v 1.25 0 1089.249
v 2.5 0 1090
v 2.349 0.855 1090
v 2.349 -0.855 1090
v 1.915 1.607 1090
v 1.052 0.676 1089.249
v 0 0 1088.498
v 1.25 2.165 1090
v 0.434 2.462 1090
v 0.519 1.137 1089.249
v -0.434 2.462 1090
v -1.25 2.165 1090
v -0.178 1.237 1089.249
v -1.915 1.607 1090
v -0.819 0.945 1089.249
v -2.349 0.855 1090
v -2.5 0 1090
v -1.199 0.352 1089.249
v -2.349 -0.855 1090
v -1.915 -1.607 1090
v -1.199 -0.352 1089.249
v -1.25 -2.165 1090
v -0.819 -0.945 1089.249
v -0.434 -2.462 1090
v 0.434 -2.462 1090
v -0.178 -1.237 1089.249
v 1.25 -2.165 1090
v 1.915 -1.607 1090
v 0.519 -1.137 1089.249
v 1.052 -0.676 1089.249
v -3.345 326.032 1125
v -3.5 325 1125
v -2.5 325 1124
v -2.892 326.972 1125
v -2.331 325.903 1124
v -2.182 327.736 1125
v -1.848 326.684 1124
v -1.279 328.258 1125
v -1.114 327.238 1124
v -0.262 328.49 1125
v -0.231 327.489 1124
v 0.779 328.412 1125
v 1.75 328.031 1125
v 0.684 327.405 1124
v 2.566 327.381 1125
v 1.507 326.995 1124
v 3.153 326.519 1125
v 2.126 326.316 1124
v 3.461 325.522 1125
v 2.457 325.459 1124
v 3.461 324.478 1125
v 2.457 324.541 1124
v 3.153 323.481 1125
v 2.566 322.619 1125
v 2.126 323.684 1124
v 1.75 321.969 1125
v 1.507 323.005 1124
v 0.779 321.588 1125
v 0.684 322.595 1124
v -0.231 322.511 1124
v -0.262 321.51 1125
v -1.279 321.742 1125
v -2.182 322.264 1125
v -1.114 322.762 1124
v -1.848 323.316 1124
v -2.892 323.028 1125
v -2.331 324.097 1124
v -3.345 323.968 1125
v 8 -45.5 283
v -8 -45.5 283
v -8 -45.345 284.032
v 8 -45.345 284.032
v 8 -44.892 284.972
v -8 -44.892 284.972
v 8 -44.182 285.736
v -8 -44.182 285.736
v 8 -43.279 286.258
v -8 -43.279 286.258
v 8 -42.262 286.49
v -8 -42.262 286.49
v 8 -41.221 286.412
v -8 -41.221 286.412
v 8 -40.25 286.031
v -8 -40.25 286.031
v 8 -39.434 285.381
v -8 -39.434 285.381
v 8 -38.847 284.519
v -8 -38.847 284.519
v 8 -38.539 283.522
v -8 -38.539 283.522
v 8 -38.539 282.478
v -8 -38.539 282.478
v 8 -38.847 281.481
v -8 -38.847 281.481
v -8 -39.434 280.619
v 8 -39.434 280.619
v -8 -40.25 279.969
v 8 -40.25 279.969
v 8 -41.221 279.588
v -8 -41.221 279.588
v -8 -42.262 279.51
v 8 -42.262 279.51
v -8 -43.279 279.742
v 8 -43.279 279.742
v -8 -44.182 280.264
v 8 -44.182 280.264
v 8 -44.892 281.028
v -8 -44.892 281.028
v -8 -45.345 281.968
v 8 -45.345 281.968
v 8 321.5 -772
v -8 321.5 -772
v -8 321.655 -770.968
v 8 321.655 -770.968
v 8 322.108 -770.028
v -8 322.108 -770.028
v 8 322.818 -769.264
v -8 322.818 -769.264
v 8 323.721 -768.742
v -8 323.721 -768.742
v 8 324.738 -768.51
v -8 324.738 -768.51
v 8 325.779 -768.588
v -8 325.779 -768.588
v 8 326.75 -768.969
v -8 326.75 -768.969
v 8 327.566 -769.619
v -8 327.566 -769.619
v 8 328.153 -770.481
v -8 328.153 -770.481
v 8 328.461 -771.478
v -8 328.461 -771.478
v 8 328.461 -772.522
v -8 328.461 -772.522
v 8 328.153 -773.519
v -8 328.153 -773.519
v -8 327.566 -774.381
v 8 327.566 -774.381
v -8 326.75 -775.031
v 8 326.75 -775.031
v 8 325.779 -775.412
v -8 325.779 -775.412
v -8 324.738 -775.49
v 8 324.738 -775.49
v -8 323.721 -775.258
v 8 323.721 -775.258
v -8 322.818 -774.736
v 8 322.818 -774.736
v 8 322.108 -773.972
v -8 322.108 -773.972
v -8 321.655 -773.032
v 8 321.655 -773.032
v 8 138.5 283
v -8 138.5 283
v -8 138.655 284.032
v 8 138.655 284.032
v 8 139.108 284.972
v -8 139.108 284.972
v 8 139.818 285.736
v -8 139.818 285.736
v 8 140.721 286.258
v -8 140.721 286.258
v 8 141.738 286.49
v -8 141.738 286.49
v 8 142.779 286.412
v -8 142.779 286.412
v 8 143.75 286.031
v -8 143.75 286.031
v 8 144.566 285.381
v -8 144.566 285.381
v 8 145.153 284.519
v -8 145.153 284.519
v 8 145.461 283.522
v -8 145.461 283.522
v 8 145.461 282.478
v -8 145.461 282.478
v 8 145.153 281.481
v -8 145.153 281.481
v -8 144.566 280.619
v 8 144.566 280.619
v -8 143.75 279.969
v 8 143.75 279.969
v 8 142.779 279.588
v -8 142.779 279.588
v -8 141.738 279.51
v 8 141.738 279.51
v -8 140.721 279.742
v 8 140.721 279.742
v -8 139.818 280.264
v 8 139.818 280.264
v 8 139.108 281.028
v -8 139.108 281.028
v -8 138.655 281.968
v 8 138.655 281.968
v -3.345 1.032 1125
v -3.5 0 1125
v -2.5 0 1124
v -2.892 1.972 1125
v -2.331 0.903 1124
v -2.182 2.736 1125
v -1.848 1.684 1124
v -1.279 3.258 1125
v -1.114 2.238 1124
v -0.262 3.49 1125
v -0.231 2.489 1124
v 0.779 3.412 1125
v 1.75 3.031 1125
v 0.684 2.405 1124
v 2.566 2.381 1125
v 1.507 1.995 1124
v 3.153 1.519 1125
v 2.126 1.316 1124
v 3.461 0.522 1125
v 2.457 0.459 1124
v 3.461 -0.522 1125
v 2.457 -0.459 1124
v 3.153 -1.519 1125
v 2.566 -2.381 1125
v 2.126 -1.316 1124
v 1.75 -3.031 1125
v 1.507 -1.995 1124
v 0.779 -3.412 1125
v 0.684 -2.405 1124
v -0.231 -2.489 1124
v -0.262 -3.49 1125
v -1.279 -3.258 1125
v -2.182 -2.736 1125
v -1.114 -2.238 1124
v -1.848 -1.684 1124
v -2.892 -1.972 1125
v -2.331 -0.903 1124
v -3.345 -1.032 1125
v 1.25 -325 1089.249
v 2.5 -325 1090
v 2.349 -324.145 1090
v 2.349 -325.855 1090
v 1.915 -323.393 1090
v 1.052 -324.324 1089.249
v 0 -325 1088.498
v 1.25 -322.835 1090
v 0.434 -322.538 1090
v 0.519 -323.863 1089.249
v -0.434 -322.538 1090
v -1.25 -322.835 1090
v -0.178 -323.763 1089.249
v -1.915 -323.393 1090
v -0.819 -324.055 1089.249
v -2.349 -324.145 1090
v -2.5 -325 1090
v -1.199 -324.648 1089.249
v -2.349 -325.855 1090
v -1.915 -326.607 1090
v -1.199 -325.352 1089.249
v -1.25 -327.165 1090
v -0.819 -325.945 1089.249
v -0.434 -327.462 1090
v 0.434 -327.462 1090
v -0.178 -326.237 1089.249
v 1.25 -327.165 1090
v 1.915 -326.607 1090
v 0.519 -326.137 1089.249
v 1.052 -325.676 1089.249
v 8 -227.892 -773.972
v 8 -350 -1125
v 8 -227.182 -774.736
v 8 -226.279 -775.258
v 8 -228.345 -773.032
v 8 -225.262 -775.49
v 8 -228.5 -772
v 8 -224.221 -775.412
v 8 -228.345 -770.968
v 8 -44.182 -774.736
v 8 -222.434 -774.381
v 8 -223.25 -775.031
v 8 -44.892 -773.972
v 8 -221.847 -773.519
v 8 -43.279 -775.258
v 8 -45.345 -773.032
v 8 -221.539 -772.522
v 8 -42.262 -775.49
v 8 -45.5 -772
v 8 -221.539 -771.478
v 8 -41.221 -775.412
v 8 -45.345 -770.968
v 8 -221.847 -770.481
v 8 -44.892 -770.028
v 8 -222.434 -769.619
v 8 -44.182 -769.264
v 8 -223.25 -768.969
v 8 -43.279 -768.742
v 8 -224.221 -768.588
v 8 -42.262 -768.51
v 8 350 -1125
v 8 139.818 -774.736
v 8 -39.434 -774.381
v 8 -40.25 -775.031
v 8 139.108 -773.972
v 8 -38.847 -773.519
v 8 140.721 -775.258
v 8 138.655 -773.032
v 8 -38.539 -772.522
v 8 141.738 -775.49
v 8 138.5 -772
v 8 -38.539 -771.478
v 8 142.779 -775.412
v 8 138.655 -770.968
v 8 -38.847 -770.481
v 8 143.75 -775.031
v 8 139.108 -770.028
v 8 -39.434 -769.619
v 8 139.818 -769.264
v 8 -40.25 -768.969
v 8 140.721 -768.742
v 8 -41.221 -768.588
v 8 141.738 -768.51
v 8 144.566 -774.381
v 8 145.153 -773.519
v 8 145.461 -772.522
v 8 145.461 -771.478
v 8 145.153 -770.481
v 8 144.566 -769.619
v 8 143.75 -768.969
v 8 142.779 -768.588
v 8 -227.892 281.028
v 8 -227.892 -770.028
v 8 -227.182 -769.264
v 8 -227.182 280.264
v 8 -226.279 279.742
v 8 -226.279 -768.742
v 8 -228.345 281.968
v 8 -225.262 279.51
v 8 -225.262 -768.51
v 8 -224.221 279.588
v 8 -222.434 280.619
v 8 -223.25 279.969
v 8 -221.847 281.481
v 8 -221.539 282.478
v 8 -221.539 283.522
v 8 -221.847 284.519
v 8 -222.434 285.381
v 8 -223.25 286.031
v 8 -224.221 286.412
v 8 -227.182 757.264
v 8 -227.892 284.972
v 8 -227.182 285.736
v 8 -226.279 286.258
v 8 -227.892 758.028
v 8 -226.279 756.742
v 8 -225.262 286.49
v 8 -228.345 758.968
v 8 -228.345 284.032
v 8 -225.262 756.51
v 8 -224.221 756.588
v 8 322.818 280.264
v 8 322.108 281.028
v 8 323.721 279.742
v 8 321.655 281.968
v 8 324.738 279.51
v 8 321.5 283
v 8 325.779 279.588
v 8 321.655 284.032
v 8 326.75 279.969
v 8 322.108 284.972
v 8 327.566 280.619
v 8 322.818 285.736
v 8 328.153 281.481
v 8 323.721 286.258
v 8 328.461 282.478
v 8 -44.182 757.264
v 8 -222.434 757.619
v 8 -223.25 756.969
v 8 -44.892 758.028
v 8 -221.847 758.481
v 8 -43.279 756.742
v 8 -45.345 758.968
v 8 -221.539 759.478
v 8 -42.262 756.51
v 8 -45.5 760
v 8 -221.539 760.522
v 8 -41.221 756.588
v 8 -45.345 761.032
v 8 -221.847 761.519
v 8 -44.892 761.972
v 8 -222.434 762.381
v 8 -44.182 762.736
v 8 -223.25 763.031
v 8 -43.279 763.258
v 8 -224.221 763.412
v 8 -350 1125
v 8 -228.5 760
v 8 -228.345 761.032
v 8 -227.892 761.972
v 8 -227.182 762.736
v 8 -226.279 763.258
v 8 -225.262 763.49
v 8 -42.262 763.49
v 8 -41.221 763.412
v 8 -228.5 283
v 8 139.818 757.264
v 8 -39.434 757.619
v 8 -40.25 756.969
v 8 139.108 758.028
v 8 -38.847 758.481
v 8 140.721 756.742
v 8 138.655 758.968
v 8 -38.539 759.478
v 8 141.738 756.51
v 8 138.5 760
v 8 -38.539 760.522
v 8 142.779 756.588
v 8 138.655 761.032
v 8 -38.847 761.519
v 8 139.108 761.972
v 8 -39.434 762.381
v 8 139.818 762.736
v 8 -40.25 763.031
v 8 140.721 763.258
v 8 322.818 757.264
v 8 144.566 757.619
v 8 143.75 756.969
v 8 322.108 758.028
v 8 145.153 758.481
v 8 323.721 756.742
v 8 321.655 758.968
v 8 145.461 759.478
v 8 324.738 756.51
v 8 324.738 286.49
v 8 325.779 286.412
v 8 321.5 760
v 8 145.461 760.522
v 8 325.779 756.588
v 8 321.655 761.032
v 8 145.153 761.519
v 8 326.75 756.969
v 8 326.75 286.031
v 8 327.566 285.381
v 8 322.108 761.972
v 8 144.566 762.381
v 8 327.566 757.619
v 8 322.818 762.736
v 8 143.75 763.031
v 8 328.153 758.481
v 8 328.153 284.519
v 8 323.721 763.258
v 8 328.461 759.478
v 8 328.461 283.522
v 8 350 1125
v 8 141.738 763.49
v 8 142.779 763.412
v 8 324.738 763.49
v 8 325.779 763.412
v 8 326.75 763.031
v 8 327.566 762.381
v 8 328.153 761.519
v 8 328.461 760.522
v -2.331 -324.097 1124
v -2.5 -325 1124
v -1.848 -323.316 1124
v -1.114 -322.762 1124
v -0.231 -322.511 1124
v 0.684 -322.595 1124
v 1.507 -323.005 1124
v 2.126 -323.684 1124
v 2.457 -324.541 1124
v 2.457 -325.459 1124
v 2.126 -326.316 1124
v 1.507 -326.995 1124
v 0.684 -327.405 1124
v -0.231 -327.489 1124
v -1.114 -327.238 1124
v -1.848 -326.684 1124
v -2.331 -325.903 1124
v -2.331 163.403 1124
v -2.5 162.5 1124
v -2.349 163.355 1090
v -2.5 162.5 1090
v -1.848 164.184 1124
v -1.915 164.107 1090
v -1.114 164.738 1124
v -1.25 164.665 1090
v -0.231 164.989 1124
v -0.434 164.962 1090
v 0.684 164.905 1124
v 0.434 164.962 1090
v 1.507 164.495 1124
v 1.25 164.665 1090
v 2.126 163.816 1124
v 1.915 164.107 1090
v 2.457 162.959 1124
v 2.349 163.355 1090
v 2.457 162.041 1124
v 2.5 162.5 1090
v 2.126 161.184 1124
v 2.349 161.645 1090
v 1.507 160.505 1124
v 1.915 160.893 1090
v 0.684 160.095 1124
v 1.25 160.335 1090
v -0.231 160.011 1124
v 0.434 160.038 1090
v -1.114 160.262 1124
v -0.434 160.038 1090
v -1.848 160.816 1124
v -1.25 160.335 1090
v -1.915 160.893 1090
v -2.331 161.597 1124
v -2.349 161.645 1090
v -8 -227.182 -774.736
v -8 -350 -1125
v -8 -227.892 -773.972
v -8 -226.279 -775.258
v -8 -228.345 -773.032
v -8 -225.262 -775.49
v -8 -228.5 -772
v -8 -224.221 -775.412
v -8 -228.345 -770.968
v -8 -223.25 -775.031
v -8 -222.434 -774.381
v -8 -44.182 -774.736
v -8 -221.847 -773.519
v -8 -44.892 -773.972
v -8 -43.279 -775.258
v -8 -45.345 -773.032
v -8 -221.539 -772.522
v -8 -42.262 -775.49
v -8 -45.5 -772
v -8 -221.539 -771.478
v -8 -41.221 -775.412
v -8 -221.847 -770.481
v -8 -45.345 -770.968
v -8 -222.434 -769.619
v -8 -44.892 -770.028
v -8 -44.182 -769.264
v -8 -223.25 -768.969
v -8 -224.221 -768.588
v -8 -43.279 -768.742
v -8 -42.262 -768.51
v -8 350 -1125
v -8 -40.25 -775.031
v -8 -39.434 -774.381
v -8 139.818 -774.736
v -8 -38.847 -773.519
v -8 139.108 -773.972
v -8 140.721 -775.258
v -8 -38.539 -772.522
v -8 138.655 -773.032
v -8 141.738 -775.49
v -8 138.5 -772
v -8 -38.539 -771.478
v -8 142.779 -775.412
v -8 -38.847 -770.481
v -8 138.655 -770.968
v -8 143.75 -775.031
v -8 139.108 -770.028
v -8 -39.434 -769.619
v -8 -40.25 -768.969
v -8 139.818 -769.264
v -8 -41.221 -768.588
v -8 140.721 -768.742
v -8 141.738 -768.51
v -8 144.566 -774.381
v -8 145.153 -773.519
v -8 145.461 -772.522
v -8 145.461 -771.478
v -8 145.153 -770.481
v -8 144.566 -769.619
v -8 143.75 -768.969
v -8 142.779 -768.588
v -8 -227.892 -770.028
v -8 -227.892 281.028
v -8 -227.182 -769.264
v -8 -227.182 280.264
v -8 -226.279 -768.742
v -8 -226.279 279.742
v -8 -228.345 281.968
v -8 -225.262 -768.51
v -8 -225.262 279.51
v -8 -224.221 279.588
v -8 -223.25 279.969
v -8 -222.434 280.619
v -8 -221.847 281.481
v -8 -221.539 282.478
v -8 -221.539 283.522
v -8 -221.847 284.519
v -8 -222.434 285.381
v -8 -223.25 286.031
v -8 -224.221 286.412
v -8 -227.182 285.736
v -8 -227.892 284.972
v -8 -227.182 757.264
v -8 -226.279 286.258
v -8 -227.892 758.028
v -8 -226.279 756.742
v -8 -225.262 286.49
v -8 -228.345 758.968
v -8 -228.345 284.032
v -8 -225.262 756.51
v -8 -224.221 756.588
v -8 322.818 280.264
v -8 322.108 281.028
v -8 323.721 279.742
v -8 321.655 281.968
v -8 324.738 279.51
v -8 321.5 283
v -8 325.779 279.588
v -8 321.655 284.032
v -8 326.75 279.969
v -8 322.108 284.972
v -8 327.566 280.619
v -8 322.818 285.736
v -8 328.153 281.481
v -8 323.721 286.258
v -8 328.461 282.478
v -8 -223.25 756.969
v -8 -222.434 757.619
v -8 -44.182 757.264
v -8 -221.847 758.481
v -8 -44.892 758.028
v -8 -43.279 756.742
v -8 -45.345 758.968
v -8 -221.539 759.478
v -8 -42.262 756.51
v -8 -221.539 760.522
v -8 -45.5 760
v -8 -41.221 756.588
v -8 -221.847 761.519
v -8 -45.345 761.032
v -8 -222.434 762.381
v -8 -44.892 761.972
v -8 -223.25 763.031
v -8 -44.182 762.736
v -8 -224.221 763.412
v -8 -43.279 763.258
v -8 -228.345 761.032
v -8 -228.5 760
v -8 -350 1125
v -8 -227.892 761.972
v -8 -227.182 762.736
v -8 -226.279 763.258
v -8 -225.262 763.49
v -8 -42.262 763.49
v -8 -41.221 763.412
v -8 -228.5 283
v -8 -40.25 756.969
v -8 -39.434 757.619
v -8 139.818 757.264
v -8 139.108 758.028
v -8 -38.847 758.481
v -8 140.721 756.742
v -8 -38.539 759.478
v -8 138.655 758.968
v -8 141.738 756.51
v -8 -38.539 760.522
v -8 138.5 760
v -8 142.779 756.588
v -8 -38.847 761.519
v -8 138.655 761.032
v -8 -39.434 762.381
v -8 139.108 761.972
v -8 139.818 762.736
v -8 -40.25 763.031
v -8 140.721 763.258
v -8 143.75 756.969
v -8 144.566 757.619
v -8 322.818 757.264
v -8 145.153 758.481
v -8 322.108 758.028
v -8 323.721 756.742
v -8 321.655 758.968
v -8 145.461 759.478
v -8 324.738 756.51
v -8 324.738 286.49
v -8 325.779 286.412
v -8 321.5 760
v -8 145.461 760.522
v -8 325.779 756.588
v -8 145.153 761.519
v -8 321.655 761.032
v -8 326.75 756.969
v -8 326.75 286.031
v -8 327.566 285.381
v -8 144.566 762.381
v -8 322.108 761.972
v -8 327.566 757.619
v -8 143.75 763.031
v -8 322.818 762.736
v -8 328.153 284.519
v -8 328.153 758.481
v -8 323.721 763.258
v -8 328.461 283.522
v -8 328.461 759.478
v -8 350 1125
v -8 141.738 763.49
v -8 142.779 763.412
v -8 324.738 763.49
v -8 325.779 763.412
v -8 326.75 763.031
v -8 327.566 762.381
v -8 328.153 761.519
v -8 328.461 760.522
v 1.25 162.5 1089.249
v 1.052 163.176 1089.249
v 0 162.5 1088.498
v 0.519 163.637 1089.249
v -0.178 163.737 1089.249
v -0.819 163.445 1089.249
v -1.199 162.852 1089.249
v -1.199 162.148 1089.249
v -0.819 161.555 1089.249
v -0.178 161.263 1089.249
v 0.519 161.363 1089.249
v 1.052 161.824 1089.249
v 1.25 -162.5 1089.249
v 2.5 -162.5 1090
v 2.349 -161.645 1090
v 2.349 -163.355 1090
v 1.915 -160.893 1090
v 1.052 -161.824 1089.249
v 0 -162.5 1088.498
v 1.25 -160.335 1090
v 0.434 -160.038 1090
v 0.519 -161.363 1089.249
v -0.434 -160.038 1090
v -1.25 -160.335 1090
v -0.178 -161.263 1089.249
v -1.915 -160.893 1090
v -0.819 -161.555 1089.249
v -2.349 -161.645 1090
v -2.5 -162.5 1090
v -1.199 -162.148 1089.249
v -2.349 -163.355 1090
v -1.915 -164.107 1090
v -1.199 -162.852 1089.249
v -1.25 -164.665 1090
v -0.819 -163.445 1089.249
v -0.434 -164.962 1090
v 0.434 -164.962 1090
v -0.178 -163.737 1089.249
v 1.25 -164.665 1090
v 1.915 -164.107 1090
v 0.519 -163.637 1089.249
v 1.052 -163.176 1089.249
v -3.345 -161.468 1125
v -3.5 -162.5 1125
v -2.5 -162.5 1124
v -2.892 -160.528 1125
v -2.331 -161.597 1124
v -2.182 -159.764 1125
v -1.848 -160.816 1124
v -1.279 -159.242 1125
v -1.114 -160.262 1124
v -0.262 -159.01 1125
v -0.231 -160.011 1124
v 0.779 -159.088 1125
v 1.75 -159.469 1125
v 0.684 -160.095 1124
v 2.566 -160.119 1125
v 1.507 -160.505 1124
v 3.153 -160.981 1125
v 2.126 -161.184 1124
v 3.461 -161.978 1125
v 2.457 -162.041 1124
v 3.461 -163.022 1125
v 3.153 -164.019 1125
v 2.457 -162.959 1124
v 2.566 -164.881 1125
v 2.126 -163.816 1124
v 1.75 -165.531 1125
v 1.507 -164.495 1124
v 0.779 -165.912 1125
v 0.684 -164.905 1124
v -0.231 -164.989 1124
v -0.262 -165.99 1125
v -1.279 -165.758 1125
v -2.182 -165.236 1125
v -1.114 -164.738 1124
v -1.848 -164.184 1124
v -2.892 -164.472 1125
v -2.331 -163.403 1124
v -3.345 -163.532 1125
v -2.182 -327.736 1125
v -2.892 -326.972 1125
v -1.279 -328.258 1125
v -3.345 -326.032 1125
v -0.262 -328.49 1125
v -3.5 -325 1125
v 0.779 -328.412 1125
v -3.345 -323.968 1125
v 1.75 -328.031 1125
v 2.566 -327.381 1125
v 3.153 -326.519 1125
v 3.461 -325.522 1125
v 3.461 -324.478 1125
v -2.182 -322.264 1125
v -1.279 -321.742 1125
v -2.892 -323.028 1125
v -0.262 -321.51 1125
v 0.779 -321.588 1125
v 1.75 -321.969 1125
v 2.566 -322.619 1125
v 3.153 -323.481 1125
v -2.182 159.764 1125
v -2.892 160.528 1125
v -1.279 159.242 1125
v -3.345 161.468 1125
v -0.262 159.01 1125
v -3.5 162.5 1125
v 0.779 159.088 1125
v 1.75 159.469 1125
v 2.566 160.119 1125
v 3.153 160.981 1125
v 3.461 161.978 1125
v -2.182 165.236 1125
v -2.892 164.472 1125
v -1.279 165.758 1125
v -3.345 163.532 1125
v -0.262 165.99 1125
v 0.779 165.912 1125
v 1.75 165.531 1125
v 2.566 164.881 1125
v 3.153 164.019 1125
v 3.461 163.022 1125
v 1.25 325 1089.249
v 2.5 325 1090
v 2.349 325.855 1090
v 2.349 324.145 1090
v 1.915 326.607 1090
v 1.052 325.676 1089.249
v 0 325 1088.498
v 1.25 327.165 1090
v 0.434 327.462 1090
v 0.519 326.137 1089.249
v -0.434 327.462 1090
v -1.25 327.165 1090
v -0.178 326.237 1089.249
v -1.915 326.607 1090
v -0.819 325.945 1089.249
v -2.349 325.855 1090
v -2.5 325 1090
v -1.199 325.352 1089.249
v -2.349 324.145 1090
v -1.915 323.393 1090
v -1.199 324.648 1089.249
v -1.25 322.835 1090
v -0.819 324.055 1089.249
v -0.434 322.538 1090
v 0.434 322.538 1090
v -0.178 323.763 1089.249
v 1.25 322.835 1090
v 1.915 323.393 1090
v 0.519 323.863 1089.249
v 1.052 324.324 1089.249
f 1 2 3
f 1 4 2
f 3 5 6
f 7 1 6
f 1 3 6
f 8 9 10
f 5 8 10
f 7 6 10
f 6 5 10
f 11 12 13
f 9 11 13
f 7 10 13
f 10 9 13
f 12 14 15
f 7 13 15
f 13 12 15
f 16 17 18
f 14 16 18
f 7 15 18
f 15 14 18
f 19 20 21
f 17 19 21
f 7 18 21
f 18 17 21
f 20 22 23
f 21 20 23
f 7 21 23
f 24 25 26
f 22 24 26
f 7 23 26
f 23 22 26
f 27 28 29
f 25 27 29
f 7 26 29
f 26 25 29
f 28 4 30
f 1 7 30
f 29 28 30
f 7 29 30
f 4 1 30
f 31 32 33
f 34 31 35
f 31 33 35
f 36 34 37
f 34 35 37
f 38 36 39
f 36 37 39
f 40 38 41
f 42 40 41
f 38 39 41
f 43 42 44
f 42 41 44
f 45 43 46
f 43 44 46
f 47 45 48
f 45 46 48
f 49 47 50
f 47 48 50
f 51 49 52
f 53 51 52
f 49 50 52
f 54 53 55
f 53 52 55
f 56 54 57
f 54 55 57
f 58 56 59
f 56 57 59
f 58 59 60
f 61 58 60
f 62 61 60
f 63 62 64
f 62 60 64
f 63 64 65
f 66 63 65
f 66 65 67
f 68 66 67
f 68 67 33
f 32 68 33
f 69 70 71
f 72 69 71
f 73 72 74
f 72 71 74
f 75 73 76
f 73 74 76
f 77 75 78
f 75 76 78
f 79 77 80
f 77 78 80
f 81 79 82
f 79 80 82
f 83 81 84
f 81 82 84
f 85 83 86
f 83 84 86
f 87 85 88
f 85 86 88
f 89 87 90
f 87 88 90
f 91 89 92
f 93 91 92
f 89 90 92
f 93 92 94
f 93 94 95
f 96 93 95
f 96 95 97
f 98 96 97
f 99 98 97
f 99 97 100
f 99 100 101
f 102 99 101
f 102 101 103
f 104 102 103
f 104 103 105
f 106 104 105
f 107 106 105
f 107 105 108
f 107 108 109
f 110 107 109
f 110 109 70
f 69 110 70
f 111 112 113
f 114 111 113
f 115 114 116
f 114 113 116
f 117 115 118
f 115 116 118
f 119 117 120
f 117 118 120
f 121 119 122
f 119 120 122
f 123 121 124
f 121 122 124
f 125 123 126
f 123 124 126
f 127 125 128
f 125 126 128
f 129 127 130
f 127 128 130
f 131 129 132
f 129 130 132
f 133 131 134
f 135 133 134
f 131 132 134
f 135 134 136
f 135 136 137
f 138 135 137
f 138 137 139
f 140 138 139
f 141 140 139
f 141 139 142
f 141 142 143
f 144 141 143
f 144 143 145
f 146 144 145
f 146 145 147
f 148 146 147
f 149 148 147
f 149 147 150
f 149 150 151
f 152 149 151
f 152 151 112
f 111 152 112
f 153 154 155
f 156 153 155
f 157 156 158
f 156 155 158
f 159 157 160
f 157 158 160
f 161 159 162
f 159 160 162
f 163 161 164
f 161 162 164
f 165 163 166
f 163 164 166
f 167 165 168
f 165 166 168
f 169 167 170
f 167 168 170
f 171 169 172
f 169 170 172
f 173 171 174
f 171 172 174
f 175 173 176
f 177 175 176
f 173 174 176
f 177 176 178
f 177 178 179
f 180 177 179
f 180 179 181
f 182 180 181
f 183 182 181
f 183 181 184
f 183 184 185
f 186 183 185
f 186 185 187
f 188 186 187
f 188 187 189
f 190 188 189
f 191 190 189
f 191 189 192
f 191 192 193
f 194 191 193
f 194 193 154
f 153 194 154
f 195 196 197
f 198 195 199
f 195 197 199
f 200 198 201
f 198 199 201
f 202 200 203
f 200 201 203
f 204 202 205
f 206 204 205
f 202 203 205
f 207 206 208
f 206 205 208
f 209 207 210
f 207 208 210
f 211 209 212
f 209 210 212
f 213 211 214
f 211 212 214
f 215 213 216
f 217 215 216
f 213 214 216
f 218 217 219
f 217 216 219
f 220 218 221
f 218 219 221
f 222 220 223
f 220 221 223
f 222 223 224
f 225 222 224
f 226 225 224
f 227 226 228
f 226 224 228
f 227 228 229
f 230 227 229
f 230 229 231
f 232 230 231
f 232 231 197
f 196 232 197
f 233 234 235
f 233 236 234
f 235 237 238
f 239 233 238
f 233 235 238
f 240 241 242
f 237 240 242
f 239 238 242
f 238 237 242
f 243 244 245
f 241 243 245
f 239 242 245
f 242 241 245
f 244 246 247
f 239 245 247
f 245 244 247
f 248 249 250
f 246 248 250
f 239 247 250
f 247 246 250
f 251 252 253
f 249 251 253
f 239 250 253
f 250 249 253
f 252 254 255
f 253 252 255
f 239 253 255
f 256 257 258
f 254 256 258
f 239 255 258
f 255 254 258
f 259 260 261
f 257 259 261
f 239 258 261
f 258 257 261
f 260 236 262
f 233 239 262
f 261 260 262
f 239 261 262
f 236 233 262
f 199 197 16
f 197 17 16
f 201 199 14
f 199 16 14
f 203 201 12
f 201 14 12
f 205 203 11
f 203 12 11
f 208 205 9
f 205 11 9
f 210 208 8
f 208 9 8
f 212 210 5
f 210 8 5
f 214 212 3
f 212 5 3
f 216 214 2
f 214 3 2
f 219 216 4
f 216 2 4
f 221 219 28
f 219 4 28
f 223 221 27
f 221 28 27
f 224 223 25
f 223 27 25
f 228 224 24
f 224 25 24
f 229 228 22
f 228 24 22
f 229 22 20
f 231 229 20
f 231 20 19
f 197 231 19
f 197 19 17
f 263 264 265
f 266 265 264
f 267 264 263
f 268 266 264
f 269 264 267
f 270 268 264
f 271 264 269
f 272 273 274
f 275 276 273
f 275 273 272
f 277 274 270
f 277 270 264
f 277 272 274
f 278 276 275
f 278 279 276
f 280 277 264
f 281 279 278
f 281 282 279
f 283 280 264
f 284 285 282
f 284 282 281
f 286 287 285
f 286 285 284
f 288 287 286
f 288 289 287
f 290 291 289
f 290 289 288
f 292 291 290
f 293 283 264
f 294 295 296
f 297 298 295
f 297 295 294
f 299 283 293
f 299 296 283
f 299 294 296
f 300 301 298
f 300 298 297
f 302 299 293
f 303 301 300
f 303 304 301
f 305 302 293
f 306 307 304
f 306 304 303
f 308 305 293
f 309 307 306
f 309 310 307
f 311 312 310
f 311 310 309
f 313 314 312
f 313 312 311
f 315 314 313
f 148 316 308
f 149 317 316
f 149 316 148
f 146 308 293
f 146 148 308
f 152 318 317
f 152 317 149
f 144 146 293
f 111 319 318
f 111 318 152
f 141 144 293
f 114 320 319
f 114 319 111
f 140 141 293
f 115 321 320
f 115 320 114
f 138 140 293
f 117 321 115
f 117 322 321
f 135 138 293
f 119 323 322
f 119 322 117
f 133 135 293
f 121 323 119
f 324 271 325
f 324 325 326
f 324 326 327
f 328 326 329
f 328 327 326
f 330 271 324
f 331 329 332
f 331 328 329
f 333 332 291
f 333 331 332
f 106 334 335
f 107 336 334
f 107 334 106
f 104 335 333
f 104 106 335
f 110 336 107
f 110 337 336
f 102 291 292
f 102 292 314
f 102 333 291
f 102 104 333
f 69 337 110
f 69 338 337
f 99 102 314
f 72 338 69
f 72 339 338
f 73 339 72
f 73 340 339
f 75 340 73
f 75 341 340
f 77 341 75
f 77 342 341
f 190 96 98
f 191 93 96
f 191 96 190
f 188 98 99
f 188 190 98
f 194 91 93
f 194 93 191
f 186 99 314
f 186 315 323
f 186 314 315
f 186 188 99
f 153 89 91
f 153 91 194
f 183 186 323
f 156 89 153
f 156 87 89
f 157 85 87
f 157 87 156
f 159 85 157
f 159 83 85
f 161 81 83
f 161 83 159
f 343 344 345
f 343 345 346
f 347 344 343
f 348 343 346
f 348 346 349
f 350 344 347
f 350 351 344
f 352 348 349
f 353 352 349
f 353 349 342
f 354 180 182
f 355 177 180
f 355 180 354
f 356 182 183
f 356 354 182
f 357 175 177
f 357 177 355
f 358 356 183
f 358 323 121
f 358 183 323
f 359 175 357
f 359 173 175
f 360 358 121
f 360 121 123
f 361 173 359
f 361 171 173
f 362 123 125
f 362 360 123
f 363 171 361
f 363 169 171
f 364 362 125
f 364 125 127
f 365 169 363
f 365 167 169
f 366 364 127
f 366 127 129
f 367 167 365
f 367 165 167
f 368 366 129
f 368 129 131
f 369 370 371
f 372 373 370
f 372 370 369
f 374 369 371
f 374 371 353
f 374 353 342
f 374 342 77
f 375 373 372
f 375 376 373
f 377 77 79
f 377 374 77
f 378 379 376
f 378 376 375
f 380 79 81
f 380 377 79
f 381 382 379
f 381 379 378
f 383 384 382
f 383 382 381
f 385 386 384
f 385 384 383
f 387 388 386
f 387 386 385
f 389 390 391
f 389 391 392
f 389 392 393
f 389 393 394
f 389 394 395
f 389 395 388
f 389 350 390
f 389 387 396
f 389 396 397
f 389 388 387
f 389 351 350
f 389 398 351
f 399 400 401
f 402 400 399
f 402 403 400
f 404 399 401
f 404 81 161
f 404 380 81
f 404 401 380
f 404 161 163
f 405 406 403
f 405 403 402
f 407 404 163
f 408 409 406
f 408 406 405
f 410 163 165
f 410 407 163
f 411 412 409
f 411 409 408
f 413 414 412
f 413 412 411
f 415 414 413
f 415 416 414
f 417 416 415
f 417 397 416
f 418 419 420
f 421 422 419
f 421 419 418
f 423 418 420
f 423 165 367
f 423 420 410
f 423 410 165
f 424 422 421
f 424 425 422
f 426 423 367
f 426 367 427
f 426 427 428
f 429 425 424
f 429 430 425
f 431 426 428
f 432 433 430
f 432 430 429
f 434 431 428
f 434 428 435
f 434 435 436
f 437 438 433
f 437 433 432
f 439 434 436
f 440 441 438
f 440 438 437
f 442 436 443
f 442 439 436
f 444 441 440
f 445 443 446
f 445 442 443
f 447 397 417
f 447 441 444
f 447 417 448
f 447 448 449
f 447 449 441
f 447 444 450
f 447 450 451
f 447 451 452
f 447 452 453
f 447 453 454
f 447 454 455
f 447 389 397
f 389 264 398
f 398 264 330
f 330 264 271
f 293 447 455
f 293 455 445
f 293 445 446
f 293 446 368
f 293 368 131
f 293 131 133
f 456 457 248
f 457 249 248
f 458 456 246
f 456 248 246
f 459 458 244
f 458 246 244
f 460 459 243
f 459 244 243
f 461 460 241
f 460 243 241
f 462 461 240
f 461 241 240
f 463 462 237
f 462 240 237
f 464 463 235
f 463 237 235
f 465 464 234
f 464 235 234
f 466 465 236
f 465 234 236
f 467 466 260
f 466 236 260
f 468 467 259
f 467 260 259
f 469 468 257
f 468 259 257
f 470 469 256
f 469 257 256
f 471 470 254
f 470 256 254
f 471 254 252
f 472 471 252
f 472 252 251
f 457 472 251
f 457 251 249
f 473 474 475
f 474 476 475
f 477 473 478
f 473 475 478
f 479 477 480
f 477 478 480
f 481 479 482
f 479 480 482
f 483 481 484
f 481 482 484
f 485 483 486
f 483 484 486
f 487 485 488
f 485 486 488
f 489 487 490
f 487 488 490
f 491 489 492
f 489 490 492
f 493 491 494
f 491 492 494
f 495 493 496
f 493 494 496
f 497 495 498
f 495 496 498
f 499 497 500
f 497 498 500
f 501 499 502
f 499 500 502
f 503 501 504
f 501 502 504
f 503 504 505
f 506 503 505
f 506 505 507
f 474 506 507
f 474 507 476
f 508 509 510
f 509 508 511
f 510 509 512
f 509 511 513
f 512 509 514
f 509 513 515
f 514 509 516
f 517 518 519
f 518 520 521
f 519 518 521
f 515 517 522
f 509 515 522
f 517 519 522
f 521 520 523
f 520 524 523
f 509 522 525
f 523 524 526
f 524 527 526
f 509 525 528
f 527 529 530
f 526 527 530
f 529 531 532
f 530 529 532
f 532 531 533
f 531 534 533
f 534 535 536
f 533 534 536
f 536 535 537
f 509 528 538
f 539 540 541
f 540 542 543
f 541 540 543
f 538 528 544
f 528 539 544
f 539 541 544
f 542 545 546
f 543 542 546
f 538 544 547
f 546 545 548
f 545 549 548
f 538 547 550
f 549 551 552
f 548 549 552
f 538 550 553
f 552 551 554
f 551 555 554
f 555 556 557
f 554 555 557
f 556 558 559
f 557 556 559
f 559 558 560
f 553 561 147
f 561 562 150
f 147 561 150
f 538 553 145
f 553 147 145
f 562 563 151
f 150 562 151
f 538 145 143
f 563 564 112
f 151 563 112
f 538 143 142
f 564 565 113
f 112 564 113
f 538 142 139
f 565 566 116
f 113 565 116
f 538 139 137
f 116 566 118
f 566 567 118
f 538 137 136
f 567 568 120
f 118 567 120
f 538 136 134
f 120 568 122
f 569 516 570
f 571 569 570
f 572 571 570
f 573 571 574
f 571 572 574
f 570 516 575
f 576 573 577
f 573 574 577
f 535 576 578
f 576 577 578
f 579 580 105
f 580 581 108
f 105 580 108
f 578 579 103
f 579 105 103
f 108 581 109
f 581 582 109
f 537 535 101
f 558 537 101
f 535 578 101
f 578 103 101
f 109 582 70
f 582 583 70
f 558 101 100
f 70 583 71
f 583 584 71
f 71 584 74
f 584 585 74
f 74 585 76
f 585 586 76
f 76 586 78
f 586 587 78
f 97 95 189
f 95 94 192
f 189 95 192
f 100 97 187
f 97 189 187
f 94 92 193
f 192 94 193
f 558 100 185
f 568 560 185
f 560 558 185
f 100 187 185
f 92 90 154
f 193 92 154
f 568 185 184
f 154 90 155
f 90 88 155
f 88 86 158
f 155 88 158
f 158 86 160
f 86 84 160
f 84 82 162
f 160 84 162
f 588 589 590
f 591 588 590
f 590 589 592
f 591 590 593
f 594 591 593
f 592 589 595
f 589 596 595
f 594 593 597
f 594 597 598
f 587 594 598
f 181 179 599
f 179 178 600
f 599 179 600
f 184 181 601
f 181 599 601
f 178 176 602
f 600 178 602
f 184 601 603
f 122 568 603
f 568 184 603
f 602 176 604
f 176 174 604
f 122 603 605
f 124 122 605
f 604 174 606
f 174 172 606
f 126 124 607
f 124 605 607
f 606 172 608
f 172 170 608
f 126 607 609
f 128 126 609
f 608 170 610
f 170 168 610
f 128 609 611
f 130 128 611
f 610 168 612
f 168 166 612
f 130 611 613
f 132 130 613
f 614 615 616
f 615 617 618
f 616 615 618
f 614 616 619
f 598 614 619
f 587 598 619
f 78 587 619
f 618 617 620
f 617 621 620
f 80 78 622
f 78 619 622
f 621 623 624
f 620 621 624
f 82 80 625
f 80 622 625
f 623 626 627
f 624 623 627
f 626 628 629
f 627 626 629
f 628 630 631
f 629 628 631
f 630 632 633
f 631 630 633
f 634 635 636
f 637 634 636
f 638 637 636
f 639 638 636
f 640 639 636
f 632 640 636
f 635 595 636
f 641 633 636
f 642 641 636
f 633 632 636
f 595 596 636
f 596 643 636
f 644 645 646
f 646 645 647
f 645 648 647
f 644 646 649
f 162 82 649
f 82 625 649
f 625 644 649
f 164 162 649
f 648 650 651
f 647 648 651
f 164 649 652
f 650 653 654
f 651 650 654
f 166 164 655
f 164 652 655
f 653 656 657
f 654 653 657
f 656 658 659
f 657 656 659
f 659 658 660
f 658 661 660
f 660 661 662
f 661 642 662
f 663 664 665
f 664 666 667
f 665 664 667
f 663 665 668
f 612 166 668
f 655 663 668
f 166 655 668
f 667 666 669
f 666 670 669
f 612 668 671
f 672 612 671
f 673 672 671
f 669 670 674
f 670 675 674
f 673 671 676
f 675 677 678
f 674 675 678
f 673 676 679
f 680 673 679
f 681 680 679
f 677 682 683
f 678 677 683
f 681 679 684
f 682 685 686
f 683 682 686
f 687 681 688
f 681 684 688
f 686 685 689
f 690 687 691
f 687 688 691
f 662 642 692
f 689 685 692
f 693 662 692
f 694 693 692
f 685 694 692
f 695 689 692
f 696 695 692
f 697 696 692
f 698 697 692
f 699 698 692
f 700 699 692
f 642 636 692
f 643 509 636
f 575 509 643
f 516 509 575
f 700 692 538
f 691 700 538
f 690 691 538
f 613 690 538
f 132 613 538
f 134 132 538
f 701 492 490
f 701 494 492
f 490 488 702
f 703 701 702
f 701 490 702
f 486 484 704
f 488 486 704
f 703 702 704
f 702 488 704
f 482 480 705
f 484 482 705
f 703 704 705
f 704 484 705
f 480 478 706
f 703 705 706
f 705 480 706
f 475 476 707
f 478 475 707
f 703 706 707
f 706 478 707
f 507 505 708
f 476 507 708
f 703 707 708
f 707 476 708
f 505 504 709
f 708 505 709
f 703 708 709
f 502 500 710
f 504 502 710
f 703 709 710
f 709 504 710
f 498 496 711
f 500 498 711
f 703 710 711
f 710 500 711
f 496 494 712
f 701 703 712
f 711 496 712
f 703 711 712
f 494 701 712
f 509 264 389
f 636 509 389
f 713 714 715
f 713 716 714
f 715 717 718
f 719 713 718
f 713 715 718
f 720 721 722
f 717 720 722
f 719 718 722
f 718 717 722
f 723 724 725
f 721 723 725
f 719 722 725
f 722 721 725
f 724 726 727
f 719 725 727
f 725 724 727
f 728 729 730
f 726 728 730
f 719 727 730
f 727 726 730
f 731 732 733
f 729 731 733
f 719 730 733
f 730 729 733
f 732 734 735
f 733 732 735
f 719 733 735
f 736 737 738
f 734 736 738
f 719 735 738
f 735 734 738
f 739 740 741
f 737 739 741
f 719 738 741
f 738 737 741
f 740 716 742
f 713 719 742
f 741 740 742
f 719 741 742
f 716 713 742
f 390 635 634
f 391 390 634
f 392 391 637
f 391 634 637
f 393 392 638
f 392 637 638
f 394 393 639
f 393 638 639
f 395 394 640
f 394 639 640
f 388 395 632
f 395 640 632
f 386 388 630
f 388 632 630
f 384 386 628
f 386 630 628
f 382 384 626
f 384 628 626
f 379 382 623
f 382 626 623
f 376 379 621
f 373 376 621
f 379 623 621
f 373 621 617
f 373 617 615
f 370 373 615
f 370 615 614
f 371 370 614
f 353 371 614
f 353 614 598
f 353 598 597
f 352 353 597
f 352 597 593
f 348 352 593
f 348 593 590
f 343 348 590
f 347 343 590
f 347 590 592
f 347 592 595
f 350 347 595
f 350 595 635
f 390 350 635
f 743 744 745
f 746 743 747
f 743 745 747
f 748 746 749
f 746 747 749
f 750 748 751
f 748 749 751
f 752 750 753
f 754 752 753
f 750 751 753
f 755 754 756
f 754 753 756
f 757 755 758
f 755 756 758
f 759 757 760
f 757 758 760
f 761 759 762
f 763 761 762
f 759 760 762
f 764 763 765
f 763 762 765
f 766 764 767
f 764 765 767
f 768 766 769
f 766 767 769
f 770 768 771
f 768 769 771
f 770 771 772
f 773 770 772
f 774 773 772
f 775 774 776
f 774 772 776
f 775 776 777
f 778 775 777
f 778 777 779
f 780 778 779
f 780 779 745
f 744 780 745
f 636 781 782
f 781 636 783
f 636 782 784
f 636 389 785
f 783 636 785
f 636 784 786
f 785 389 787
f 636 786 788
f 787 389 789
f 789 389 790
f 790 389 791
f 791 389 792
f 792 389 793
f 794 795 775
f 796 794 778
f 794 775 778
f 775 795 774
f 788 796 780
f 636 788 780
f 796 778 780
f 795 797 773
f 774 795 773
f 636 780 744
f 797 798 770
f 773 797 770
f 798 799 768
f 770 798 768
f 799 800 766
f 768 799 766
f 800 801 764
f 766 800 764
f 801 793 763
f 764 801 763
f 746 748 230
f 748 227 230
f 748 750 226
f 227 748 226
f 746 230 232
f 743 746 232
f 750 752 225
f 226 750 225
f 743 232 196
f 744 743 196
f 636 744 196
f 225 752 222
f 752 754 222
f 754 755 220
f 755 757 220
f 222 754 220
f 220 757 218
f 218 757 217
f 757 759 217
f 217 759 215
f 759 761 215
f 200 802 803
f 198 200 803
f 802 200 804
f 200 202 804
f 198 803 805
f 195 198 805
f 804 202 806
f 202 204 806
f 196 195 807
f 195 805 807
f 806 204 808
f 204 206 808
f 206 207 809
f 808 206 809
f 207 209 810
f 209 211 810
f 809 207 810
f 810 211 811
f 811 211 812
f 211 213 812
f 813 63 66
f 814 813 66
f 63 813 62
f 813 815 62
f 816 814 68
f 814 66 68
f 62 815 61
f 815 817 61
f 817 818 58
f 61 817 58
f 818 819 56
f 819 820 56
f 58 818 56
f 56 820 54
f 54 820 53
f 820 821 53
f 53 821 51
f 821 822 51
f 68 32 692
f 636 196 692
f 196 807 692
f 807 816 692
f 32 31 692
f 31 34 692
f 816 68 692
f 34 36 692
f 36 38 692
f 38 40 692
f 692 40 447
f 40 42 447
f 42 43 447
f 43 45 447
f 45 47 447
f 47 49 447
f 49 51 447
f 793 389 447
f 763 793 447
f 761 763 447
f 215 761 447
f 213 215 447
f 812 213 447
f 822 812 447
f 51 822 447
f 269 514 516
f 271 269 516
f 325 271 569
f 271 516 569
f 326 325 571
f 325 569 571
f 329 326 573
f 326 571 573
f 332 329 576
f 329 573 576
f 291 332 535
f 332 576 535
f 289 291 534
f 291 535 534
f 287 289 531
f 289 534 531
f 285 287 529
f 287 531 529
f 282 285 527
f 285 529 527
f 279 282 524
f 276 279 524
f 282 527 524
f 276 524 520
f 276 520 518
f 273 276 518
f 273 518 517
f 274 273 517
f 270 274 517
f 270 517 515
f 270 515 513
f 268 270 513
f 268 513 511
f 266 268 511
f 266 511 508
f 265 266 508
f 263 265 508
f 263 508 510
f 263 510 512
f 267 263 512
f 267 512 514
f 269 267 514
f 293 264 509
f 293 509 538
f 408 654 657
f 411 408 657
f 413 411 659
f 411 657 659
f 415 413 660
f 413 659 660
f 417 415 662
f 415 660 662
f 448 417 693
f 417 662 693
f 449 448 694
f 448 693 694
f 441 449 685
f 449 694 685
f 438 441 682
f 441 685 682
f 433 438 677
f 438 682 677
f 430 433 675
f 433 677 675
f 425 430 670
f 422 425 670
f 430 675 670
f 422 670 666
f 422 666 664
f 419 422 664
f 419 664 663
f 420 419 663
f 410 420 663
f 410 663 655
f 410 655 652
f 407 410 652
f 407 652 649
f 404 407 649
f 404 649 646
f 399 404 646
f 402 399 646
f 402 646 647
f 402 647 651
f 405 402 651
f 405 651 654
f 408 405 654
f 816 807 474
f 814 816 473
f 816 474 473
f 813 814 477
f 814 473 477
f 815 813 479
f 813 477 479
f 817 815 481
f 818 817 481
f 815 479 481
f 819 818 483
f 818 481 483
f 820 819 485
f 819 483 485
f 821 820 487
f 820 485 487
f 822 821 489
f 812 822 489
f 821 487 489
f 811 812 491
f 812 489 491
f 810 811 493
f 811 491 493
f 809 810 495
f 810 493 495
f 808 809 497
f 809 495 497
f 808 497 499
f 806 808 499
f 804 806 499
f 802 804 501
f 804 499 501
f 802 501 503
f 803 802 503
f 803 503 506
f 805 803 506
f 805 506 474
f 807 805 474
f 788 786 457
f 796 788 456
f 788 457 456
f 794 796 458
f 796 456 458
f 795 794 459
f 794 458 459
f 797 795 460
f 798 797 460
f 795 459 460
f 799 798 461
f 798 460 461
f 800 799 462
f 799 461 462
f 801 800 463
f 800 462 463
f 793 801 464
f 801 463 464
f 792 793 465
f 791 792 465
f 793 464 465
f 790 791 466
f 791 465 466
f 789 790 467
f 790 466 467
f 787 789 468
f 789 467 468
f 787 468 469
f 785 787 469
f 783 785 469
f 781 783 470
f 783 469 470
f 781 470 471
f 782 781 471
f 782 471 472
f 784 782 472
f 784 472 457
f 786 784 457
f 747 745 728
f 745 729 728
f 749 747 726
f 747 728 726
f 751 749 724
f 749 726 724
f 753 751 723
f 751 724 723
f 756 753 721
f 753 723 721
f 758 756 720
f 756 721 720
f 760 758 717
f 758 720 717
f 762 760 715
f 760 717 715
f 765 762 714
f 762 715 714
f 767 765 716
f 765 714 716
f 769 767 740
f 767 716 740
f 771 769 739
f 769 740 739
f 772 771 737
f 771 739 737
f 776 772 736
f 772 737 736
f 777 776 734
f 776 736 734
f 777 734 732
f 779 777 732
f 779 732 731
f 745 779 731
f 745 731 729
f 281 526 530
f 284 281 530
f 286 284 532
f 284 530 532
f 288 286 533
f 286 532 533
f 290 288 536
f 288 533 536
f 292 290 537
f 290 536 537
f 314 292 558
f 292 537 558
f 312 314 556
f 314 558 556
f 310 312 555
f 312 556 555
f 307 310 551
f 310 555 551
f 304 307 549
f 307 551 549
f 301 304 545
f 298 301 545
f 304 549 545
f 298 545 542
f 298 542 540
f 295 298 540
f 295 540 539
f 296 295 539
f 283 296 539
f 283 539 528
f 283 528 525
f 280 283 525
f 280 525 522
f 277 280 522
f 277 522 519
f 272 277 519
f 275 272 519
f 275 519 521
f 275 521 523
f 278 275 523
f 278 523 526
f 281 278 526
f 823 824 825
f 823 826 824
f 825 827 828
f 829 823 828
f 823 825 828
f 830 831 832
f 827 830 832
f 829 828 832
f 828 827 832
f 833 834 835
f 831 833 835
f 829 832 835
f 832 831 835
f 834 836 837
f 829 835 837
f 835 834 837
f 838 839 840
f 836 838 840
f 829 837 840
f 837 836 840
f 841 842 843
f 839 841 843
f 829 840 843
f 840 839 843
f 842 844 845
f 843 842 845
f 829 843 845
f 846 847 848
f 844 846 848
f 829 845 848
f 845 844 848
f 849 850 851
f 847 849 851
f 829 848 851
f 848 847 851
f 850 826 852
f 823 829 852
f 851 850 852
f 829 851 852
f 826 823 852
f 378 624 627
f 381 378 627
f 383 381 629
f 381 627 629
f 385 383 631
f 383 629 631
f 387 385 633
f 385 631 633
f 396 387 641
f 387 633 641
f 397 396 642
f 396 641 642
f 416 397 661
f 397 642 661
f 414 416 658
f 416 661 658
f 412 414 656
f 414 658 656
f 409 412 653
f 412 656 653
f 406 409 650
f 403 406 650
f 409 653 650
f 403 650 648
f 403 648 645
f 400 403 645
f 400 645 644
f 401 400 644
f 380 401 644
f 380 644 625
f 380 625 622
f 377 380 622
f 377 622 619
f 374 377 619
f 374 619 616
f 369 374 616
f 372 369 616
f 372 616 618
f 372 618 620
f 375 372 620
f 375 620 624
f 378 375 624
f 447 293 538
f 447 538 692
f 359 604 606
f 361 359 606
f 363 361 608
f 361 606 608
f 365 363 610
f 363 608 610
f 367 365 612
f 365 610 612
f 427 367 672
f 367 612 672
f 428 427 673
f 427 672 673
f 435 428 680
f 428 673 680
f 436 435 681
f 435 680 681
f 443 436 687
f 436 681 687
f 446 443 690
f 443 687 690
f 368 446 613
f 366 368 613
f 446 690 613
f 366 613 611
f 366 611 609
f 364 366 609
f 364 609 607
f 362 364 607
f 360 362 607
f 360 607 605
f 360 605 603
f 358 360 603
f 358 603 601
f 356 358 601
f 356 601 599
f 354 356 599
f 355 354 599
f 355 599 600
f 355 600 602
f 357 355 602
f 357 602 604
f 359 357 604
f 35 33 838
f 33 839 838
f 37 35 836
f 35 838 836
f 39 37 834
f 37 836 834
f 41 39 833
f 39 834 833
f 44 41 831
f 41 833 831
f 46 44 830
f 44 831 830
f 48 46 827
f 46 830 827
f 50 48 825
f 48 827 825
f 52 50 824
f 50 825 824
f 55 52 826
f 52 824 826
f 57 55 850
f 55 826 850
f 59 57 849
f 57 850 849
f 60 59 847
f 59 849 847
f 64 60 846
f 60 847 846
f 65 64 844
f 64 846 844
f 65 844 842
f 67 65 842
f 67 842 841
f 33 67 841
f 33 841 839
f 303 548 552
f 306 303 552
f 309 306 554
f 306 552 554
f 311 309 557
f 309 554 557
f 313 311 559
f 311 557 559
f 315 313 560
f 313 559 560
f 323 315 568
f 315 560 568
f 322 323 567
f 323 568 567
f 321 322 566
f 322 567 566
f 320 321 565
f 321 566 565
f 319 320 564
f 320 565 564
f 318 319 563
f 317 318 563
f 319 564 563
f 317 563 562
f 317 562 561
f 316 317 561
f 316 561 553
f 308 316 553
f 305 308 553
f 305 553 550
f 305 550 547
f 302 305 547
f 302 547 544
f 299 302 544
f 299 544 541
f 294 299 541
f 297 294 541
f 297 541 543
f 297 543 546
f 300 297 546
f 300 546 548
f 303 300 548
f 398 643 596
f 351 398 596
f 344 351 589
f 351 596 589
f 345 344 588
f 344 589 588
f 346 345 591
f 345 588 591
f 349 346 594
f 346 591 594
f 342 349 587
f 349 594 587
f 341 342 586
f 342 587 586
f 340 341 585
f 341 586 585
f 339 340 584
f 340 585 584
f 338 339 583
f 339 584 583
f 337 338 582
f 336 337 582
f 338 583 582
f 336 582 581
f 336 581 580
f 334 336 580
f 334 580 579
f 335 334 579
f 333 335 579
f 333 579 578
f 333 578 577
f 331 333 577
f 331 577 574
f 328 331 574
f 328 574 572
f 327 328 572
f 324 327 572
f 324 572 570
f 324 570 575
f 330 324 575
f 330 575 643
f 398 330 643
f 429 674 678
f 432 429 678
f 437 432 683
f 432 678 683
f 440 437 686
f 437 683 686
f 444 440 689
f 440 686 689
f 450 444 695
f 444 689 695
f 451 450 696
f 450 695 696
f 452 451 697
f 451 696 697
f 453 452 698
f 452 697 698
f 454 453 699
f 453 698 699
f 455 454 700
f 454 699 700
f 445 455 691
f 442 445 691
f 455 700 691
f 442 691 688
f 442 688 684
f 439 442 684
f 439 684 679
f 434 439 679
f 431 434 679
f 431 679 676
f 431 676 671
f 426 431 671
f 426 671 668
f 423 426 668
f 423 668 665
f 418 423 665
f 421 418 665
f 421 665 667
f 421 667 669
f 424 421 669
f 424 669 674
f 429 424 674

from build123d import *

# Parameters (mm, degrees)
F0_W           = 700
F0_H           = 2250
F1_DEPTH       = 8
F3_D           = 5
F3_DEPTH       = 35
F3_CSINK_D     = 7
F3_CSINK_ANGLE = 90
F3_TIP         = 1.5021515476
F5_D           = 7


# Not quite as in the source:
# - a feature names something its author has since deleted; it is built from what else it names


with BuildPart() as f1:
    # F0 (on Right) → F1 (new body, symmetric)
    with BuildSketch(Plane.YZ):
        Rectangle(F0_W, F0_H)
    extrude(amount=F1_DEPTH, both=True)

    # F3
    with Locations(Plane.XY.offset(1125)):
        with Locations((0, 325), (0, 162.5), (0, 0), (0, -162.5), (0, -325)):
            CounterSinkHole(F3_D / 2, F3_CSINK_D / 2, depth=F3_DEPTH, counter_sink_angle=F3_CSINK_ANGLE)
            with Locations((0, 0, -(F3_DEPTH + F3_TIP / 2))):  # 118° drill point
                Cone(0, F3_D / 2, F3_TIP, mode=Mode.SUBTRACT)

    # F5 (through all)
    with Locations(Plane.YZ.offset(8)):
        with Locations((-225, 760), (-42, 760), (142, 760), (325, 760), (325, 283), (142, 283), (-42, 283), (-225, 283), (325, -772), (142, -772), (-42, -772), (-225, -772)):
            Hole(F5_D / 2)


solid = f1.part
